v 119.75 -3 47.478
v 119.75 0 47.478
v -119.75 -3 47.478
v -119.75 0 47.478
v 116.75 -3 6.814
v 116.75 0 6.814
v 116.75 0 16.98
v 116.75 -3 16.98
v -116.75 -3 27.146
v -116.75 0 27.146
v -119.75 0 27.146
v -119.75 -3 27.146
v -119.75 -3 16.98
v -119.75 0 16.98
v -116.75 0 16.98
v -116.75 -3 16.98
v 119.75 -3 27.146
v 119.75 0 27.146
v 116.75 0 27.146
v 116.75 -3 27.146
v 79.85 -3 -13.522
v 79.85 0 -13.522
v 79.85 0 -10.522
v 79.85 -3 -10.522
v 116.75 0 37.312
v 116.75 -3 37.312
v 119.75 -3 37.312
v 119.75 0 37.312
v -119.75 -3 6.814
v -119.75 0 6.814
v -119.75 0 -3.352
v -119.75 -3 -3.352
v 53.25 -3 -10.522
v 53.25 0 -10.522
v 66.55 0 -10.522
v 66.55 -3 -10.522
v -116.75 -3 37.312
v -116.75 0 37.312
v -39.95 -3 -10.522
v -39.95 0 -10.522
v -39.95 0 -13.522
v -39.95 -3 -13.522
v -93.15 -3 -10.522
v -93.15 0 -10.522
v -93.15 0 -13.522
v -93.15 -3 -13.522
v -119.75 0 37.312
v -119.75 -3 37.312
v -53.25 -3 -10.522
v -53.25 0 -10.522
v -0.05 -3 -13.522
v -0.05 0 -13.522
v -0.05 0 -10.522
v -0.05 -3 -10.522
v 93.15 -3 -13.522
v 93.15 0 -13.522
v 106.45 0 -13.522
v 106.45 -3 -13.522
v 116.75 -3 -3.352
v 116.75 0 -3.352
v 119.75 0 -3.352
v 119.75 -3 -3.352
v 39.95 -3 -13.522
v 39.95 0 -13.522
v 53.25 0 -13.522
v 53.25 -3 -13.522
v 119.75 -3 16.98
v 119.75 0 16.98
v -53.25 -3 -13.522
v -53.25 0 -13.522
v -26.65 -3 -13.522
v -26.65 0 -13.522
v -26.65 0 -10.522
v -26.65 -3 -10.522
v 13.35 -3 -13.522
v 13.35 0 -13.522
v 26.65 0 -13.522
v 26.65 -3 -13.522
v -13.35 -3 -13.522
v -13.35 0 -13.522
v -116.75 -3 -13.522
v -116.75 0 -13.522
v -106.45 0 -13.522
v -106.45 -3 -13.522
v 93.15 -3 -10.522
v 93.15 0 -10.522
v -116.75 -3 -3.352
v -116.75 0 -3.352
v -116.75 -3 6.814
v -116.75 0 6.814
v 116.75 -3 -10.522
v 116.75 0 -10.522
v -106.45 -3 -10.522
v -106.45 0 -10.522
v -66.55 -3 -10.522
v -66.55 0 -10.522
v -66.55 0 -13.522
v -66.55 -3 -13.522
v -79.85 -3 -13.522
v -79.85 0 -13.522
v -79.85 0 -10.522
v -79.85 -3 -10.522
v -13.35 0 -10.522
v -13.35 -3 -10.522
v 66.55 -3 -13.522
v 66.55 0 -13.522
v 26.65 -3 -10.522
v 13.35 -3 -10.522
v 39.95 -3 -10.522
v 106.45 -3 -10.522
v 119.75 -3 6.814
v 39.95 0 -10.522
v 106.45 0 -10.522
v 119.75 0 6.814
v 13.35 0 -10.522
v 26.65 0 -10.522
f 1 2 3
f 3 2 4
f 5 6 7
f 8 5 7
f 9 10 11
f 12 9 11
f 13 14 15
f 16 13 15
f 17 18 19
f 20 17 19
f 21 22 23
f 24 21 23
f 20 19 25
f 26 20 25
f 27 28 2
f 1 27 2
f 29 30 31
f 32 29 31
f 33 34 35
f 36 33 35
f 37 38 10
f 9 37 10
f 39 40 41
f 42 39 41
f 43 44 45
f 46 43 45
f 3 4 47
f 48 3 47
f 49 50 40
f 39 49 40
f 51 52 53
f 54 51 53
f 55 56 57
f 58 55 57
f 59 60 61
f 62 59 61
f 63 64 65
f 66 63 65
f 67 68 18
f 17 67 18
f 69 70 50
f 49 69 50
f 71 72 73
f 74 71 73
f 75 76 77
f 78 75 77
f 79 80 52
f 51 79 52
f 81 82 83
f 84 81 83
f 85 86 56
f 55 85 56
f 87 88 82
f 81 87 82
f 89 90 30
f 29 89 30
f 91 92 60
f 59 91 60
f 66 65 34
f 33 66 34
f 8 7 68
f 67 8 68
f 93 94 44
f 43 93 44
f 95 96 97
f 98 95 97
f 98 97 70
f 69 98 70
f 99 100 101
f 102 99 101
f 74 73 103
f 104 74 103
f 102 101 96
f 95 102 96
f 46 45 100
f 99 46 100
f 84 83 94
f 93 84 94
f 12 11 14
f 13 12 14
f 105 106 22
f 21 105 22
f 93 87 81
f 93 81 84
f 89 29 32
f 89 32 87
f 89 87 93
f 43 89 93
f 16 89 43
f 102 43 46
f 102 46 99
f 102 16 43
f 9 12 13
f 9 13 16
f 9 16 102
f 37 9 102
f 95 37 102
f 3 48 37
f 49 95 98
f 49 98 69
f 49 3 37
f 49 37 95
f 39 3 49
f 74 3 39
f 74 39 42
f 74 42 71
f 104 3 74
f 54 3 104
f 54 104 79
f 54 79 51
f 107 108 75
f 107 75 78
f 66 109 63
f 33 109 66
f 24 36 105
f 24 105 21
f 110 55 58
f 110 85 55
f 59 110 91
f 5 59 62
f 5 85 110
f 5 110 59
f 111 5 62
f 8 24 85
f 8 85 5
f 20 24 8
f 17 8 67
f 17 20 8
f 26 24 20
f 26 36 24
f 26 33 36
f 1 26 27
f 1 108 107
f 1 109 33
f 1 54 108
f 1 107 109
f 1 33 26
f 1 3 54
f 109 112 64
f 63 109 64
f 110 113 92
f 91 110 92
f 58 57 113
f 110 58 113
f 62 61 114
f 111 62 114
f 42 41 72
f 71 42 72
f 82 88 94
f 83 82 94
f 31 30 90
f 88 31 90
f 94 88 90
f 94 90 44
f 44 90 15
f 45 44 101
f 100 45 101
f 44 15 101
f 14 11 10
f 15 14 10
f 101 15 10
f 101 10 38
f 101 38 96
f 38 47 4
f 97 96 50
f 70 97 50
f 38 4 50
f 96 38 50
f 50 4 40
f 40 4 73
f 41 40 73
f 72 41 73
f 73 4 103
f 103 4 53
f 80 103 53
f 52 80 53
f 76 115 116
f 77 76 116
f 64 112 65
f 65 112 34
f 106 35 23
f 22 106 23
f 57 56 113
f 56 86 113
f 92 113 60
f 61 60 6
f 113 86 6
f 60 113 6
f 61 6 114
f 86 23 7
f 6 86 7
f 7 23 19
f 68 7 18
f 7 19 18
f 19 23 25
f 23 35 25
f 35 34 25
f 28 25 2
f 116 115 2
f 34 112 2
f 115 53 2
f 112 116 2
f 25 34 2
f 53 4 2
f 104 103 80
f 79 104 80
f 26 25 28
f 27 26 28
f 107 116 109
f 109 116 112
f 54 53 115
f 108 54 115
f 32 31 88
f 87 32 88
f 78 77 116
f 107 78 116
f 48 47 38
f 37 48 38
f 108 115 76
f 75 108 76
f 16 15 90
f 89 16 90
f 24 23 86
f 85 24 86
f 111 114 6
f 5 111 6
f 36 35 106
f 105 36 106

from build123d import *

# Parameters (mm, degrees)
F1_DEPTH = 3


with BuildPart() as f1:
    # F0 (on Front) → F1 (new body)
    with BuildSketch(Plane.XZ):
        Polygon((93.15, -13.522226), (106.45, -13.522226), (106.45, -10.522226), (116.75, -10.522226), (116.75, -3.352226), (119.75, -3.352226), (119.75, 6.813774), (116.75, 6.813774), (116.75, 16.979774), (119.75, 16.979774), (119.75, 27.145774), (116.75, 27.145774), (116.75, 37.311774), (119.75, 37.311774), (119.75, 47.477774), (-119.75, 47.477774), (-119.75, 37.311774), (-116.75, 37.311774), (-116.75, 27.145774), (-119.75, 27.145774), (-119.75, 16.979774), (-116.75, 16.979774), (-116.75, 6.813774), (-119.75, 6.813774), (-119.75, -3.352226), (-116.75, -3.352226), (-116.75, -13.522226), (-106.45, -13.522226), (-106.45, -10.522226), (-93.15, -10.522226), (-93.15, -13.522226), (-79.85, -13.522226), (-79.85, -10.522226), (-66.55, -10.522226), (-66.55, -13.522226), (-53.25, -13.522226), (-53.25, -10.522226), (-39.95, -10.522226), (-39.95, -13.522226), (-26.65, -13.522226), (-26.65, -10.522226), (-13.35, -10.522226), (-13.35, -13.522226), (-0.05, -13.522226), (-0.05, -10.522226), (0.05, -10.522226), (13.35, -10.522226), (13.35, -13.522226), (26.65, -13.522226), (26.65, -10.522226), (39.95, -10.522226), (39.95, -13.522226), (53.25, -13.522226), (53.25, -10.522226), (66.55, -10.522226), (66.55, -13.522226), (79.85, -13.522226), (79.85, -10.522226), (93.15, -10.522226), align=None)
    extrude(amount=F1_DEPTH)


solid = f1.part
